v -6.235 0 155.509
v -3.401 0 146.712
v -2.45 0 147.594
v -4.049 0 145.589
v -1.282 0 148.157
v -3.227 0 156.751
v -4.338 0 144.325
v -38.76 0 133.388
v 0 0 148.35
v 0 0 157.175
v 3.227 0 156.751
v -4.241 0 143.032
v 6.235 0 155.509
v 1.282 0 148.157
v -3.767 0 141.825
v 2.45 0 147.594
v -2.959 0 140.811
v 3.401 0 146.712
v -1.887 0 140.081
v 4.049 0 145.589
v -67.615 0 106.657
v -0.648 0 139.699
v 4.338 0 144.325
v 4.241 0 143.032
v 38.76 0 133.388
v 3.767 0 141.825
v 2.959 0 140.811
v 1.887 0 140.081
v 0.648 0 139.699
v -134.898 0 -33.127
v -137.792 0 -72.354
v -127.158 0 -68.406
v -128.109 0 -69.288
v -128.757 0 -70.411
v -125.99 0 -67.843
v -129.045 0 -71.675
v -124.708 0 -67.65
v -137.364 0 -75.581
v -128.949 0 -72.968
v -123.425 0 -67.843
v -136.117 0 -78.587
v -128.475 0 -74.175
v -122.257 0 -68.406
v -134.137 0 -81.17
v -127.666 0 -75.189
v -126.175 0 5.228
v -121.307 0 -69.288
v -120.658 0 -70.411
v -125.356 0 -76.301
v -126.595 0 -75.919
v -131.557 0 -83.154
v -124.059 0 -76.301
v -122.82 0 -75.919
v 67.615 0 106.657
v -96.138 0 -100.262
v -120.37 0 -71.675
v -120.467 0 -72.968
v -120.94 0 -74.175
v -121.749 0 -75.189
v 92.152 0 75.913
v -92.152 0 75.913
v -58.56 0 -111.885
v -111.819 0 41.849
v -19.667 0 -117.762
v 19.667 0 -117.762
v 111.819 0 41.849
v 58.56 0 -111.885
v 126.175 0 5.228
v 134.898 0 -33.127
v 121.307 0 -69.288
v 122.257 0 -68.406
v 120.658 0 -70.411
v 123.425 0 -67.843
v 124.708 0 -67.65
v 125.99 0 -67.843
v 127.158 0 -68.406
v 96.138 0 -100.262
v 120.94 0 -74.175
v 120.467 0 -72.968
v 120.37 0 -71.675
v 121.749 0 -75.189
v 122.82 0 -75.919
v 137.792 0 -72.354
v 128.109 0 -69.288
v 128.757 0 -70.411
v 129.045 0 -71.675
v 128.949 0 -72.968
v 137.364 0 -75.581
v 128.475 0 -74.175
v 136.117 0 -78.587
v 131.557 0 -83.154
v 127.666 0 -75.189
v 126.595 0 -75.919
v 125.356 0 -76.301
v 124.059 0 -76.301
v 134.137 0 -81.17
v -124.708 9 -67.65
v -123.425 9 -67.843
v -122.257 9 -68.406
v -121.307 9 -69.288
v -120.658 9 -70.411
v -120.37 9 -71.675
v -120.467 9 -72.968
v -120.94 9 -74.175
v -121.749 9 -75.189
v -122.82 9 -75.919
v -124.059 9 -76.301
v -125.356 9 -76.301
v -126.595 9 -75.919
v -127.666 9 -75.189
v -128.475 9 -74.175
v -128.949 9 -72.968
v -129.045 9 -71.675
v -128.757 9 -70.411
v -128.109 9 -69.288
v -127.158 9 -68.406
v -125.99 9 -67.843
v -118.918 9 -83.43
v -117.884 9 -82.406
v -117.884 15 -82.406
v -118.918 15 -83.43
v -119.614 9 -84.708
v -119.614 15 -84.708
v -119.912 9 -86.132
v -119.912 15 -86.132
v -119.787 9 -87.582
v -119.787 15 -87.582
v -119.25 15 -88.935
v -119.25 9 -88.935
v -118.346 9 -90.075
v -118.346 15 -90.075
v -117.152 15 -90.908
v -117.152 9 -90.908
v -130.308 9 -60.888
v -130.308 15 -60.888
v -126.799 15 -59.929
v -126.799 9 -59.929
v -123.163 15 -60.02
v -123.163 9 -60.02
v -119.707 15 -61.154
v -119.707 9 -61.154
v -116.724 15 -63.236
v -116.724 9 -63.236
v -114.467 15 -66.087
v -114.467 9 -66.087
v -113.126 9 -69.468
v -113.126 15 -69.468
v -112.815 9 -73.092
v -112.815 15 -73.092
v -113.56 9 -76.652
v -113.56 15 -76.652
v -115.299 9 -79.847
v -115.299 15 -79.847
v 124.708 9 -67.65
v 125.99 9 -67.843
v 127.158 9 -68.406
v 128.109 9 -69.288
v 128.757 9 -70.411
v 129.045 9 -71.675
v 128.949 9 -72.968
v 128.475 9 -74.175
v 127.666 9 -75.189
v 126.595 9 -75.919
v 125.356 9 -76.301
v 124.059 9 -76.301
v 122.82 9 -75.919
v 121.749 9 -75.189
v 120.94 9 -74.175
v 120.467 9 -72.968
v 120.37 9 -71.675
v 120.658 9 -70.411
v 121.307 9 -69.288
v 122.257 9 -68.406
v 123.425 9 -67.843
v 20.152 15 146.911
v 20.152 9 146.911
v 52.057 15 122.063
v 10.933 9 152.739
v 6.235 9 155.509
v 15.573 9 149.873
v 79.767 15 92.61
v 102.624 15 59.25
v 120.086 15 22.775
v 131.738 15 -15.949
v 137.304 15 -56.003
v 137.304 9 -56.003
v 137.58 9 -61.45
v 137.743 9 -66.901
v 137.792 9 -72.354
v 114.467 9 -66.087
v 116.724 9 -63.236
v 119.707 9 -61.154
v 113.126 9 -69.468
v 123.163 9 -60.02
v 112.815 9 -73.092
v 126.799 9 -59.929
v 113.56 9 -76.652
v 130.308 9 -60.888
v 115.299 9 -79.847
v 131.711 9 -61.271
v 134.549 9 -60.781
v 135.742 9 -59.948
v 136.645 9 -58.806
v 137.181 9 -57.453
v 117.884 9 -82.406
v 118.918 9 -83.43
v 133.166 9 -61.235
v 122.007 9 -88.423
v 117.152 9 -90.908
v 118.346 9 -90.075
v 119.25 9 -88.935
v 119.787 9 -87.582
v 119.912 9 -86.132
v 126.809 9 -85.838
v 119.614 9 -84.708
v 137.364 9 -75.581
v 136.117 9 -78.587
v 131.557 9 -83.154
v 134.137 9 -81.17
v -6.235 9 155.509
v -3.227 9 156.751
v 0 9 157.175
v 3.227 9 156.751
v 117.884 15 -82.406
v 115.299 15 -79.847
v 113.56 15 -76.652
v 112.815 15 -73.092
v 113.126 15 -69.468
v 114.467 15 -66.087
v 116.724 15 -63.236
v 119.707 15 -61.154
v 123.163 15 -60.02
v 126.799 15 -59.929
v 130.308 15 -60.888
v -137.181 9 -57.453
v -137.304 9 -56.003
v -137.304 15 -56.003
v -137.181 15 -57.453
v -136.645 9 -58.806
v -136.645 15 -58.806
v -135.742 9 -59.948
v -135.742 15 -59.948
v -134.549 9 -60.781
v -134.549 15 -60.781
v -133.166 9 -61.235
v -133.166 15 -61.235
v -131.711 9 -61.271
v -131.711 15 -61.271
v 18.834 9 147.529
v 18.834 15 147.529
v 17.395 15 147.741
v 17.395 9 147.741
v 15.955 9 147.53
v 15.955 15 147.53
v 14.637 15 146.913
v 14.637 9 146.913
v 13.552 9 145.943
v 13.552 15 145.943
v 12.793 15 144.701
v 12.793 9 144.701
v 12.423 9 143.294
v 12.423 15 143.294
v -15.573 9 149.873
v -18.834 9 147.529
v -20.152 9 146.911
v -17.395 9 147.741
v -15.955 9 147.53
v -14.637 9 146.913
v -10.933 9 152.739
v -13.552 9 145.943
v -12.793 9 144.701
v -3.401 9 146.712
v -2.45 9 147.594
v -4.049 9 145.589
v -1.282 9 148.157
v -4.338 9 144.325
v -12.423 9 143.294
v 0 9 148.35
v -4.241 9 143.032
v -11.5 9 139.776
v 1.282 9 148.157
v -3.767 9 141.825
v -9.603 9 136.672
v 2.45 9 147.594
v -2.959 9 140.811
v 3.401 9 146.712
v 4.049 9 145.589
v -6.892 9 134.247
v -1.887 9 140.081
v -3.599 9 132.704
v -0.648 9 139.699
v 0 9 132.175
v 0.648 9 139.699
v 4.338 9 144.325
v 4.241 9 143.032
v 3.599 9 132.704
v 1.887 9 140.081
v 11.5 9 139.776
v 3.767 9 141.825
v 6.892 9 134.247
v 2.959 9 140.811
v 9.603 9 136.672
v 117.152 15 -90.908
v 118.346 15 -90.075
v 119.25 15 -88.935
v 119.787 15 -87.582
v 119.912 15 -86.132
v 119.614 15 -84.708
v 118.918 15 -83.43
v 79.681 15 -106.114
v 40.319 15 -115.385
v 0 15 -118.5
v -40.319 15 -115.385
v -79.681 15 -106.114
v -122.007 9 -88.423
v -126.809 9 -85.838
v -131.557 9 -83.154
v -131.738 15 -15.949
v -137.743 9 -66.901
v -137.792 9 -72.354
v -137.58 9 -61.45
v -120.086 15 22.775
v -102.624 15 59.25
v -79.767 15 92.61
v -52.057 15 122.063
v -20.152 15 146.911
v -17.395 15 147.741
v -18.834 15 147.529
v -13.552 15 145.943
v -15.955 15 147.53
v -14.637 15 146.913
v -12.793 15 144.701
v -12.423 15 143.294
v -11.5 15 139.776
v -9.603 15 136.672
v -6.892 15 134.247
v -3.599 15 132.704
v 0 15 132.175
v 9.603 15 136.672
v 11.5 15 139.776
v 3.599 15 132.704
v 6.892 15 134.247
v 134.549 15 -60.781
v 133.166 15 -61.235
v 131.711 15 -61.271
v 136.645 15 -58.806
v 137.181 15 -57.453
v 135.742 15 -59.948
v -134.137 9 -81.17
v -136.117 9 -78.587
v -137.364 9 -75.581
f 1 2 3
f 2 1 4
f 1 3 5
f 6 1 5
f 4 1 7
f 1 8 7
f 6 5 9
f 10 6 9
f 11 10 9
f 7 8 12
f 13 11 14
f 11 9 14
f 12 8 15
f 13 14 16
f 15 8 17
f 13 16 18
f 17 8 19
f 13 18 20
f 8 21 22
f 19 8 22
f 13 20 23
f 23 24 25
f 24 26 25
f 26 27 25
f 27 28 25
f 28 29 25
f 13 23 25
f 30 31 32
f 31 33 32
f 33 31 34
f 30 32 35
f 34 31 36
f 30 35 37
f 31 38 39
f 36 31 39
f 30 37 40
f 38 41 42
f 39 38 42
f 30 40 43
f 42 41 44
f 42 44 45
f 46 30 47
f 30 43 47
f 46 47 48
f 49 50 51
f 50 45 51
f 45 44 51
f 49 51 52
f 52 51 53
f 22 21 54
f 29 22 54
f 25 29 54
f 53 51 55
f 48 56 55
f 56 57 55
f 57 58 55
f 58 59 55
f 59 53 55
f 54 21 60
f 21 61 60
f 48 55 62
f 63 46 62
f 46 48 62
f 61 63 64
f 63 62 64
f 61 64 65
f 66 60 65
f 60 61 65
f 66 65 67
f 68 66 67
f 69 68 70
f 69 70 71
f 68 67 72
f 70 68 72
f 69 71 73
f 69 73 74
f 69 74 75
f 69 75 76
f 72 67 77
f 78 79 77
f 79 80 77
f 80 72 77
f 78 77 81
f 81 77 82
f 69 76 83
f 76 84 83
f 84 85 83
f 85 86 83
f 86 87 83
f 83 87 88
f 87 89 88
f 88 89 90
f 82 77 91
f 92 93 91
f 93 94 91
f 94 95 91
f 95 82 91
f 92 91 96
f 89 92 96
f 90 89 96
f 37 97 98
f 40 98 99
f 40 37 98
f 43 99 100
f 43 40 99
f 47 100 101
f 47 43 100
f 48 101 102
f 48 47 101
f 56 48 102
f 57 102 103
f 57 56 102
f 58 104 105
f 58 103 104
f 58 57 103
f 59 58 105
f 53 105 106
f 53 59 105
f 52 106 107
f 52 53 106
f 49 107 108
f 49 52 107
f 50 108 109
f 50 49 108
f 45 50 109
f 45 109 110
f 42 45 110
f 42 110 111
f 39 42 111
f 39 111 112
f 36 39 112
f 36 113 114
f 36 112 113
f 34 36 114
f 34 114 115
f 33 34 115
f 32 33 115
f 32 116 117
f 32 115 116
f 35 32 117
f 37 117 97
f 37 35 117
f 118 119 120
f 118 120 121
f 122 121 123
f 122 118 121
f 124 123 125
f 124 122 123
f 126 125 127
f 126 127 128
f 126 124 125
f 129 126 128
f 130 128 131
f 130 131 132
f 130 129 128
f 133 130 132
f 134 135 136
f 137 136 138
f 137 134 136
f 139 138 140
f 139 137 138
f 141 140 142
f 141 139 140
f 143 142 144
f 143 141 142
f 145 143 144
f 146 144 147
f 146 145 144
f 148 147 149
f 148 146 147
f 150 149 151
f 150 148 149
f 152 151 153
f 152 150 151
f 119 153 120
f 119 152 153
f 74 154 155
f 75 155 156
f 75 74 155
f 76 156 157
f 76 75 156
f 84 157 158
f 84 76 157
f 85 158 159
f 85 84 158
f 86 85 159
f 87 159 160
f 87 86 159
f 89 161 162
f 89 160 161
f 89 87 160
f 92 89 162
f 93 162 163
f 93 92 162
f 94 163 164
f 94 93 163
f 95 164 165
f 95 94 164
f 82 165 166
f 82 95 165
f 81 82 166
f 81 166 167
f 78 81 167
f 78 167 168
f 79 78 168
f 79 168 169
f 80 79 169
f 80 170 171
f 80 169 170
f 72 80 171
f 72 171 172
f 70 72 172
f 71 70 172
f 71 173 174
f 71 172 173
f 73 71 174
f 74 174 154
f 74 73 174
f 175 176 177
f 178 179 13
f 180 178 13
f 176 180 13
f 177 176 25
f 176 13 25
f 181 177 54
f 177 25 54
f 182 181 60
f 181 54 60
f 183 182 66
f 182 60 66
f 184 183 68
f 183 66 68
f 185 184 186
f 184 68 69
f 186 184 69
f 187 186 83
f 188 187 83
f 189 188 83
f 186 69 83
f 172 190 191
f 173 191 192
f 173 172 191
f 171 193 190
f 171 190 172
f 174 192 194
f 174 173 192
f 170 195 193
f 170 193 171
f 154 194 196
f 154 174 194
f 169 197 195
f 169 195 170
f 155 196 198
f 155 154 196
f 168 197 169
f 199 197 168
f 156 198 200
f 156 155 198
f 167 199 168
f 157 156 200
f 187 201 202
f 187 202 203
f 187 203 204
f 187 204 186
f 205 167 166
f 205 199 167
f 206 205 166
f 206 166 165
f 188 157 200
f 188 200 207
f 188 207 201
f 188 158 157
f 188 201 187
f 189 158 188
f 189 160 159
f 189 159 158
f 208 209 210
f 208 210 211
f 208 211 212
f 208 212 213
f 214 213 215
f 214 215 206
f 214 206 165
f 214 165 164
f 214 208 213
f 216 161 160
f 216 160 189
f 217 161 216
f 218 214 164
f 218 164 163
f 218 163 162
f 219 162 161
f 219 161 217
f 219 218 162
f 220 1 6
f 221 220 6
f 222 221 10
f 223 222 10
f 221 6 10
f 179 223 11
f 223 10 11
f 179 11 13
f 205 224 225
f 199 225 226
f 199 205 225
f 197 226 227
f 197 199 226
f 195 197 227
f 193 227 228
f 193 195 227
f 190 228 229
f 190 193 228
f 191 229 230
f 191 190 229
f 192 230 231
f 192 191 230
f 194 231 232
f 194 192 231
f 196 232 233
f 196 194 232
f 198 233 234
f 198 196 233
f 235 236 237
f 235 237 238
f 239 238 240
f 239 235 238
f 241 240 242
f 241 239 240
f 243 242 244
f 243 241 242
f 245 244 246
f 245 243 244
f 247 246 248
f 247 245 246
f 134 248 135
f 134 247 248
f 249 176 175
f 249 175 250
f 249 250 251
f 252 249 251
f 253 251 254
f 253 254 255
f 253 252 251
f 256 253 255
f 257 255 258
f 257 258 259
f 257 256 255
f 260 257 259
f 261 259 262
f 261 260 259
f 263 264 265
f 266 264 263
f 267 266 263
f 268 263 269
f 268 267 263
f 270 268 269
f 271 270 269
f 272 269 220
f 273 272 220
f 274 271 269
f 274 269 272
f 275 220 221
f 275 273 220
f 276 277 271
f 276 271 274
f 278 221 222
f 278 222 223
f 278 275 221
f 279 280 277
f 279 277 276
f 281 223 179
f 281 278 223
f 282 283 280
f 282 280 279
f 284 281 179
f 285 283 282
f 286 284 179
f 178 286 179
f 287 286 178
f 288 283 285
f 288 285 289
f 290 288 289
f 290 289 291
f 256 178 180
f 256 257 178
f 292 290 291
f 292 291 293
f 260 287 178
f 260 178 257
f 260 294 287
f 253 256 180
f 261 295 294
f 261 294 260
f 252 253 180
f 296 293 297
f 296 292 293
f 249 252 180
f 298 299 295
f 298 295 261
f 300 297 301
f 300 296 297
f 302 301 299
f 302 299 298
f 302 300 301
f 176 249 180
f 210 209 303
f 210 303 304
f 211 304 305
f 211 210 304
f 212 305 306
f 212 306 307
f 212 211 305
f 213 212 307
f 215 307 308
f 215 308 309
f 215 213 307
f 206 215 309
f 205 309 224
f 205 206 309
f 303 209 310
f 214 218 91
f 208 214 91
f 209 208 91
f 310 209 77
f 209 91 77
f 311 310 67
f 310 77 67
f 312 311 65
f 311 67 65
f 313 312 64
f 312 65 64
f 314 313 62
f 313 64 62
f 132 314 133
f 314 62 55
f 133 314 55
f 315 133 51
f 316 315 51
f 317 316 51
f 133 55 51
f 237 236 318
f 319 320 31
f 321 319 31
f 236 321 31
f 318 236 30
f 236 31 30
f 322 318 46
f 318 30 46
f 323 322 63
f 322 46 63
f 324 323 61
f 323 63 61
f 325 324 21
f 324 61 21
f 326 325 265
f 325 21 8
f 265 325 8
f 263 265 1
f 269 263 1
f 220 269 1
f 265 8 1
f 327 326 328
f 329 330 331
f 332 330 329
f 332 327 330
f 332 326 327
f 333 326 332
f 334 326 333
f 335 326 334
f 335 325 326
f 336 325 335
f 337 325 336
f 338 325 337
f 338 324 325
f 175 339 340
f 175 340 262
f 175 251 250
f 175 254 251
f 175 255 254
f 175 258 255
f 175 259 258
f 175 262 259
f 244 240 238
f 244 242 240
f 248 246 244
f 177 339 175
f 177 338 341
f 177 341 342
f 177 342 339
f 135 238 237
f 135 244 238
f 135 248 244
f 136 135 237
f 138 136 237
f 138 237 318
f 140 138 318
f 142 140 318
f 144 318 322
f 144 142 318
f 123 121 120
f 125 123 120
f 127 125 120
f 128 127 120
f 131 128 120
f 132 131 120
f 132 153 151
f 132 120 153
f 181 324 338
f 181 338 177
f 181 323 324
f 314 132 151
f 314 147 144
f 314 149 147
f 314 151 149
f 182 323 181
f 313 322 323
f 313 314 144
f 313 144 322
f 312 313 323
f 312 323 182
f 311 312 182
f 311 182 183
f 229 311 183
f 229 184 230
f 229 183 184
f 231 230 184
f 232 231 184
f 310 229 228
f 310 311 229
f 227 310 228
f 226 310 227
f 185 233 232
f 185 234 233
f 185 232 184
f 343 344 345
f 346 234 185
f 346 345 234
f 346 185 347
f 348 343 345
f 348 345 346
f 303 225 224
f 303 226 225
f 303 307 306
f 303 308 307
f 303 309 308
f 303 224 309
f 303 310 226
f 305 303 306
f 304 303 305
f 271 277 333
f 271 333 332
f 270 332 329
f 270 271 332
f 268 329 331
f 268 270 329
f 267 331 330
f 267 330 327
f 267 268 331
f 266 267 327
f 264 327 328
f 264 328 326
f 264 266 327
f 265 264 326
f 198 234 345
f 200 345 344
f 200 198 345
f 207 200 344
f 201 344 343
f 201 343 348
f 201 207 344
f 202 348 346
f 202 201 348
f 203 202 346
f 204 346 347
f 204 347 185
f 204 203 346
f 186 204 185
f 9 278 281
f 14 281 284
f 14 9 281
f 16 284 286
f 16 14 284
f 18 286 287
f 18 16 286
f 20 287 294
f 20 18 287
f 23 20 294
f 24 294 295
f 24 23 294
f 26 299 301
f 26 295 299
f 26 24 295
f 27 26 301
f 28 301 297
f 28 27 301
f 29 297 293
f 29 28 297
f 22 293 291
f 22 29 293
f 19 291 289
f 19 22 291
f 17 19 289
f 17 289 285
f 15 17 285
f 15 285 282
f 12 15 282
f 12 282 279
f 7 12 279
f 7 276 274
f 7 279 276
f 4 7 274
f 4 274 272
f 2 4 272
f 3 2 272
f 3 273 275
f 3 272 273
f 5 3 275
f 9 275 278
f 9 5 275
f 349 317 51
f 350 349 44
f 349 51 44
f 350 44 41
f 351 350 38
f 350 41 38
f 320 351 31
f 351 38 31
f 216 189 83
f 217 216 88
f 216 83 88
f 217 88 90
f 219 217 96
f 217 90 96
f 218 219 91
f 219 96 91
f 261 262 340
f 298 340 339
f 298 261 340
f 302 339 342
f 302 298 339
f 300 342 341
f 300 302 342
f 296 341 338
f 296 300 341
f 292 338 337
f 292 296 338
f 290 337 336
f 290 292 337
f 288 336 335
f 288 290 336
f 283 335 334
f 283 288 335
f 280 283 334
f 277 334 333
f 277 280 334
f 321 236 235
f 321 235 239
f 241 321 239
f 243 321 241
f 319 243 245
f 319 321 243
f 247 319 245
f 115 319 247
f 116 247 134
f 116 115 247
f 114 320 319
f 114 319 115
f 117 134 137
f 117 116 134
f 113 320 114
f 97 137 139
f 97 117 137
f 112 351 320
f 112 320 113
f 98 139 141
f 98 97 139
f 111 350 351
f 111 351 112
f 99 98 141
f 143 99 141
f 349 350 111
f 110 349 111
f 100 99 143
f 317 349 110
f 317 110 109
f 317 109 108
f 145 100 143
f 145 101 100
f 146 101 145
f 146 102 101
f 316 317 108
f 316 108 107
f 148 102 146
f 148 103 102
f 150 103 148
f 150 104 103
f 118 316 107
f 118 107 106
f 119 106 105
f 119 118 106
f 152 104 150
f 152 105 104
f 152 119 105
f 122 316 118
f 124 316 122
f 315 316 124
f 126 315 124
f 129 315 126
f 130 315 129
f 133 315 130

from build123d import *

# Parameters (mm, degrees)
CROQUIS2_R                 = 4.35
ESPESOR_DE_BASE_FIJA_DEPTH = 15
CUT_EXTRUDE1_START         = -6
SKETCH2_R                  = 12.5
CUT_EXTRUDE1_DEPTH         = 6
FILLET1_START              = 9
FILLET1_DEPTH              = 7


with BuildPart() as part:
    # Croquis2 → Espesor de base fija (new body)
    with BuildSketch(Plane(origin=(0, 0, 0), x_dir=(1, 0, 0), z_dir=(0, 1, 0))):
        with BuildLine():
            ThreePointArc((131.556719836, 83.154307611), (0, 118.5), (-131.556719836, 83.154307611))
            ThreePointArc((-131.556719836, 83.154307611), (-136.117431676, 78.58743582), (-137.792102743, 72.354307611))
            ThreePointArc((-137.792102743, 72.354307611), (-102.624010348, -59.25), (-6.235382907, -155.508615221))
            ThreePointArc((-6.235382907, -155.508615221), (0, -157.17487164), (6.235382907, -155.508615221))
            ThreePointArc((6.235382907, -155.508615221), (102.624010348, -59.25), (137.792102743, 72.354307611))
            ThreePointArc((137.792102743, 72.354307611), (136.117431676, 78.58743582), (131.556719836, 83.154307611))
        make_face()
        with Locations(Location((0, -144, 0), (0, 0, 270))):
            Circle(CROQUIS2_R, mode=Mode.SUBTRACT)
        with Locations(Location((-124.707658145, 72, 0), (0, 0, 270))):
            Circle(CROQUIS2_R, mode=Mode.SUBTRACT)
        with Locations(Location((124.707658145, 72, 0), (0, 0, 270))):
            Circle(CROQUIS2_R, mode=Mode.SUBTRACT)
    extrude(amount=ESPESOR_DE_BASE_FIJA_DEPTH)

    # Sketch2 → Cut-Extrude1 (cut)
    with BuildSketch(Plane(origin=(0, 15, 0), x_dir=(1, 0, 0), z_dir=(0, 1, 0)).offset(CUT_EXTRUDE1_START)):
        with Locations((-125.292114129, 72.33743582)):
            Circle(SKETCH2_R)
        with Locations((125.292114129, 72.33743582)):
            Circle(SKETCH2_R)
        with Locations((0, -144.67487164)):
            Circle(SKETCH2_R)
    extrude(amount=CUT_EXTRUDE1_DEPTH, mode=Mode.SUBTRACT)

    # Fillet1: read off the stored shape, not the designer's step
    # Fillet1 outline → Fillet1 (cut)
    with BuildSketch(Plane(origin=(0, 0, 0), x_dir=(1, 0, 0), z_dir=(0, 1, 0)).offset(FILLET1_START)):
        with BuildLine():
            ThreePointArc((-117.884129659, 82.405790506), (-119.902519436, 86.861880767), (-117.152410353, 90.907562135))
            ThreePointArc((-117.152410353, 90.907562135), (-124.41497538, 87.143167542), (-131.556719836, 83.154307611))
            ThreePointArc((-131.556719836, 83.154307611), (-124.608814624, 84.818745919), (-117.884129659, 82.405790506))
        make_face()
        with BuildLine():
            ThreePointArc((131.556719836, 83.154307611), (124.41497538, 87.143167542), (117.152410353, 90.907562136))
            ThreePointArc((117.152410353, 90.907562136), (119.902519436, 86.861880767), (117.884129659, 82.405790506))
            ThreePointArc((117.884129659, 82.405790506), (124.608814624, 84.818745919), (131.556719836, 83.154307611))
        make_face()
        with BuildLine():
            ThreePointArc((-137.304463382, 56.003182413), (-135.175855082, 60.407687426), (-130.307572826, 60.887755734))
            ThreePointArc((-130.307572826, 60.887755734), (-135.759595995, 65.505026041), (-137.792102743, 72.354307611))
            ThreePointArc((-137.792102743, 72.354307611), (-137.675684548, 64.174945519), (-137.304463382, 56.003182413))
        make_face()
        with BuildLine():
            ThreePointArc((137.792102743, 72.354307611), (135.759595995, 65.505026041), (130.307572826, 60.887755734))
            ThreePointArc((130.307572826, 60.887755734), (135.175855082, 60.407687426), (137.304463382, 56.003182413))
            ThreePointArc((137.304463382, 56.003182413), (137.675684548, 64.174945519), (137.792102743, 72.354307611))
        make_face()
        with BuildLine():
            ThreePointArc((-12.423443168, -143.29354624), (-15.273335646, -147.269568193), (-20.152053029, -146.910744548))
            ThreePointArc((-20.152053029, -146.910744548), (-13.260709167, -151.31811306), (-6.235382907, -155.508615221))
            ThreePointArc((-6.235382907, -155.508615221), (-11.15078137, -150.323771959), (-12.423443168, -143.29354624))
        make_face()
        with BuildLine():
            ThreePointArc((6.235382907, -155.508615221), (13.260709167, -151.31811306), (20.152053029, -146.910744548))
            ThreePointArc((20.152053029, -146.910744548), (15.273335646, -147.269568193), (12.423443168, -143.29354624))
            ThreePointArc((12.423443168, -143.29354624), (11.15078137, -150.323771959), (6.235382907, -155.508615221))
        make_face()
    extrude(amount=FILLET1_DEPTH, mode=Mode.SUBTRACT)


solid = part.part
